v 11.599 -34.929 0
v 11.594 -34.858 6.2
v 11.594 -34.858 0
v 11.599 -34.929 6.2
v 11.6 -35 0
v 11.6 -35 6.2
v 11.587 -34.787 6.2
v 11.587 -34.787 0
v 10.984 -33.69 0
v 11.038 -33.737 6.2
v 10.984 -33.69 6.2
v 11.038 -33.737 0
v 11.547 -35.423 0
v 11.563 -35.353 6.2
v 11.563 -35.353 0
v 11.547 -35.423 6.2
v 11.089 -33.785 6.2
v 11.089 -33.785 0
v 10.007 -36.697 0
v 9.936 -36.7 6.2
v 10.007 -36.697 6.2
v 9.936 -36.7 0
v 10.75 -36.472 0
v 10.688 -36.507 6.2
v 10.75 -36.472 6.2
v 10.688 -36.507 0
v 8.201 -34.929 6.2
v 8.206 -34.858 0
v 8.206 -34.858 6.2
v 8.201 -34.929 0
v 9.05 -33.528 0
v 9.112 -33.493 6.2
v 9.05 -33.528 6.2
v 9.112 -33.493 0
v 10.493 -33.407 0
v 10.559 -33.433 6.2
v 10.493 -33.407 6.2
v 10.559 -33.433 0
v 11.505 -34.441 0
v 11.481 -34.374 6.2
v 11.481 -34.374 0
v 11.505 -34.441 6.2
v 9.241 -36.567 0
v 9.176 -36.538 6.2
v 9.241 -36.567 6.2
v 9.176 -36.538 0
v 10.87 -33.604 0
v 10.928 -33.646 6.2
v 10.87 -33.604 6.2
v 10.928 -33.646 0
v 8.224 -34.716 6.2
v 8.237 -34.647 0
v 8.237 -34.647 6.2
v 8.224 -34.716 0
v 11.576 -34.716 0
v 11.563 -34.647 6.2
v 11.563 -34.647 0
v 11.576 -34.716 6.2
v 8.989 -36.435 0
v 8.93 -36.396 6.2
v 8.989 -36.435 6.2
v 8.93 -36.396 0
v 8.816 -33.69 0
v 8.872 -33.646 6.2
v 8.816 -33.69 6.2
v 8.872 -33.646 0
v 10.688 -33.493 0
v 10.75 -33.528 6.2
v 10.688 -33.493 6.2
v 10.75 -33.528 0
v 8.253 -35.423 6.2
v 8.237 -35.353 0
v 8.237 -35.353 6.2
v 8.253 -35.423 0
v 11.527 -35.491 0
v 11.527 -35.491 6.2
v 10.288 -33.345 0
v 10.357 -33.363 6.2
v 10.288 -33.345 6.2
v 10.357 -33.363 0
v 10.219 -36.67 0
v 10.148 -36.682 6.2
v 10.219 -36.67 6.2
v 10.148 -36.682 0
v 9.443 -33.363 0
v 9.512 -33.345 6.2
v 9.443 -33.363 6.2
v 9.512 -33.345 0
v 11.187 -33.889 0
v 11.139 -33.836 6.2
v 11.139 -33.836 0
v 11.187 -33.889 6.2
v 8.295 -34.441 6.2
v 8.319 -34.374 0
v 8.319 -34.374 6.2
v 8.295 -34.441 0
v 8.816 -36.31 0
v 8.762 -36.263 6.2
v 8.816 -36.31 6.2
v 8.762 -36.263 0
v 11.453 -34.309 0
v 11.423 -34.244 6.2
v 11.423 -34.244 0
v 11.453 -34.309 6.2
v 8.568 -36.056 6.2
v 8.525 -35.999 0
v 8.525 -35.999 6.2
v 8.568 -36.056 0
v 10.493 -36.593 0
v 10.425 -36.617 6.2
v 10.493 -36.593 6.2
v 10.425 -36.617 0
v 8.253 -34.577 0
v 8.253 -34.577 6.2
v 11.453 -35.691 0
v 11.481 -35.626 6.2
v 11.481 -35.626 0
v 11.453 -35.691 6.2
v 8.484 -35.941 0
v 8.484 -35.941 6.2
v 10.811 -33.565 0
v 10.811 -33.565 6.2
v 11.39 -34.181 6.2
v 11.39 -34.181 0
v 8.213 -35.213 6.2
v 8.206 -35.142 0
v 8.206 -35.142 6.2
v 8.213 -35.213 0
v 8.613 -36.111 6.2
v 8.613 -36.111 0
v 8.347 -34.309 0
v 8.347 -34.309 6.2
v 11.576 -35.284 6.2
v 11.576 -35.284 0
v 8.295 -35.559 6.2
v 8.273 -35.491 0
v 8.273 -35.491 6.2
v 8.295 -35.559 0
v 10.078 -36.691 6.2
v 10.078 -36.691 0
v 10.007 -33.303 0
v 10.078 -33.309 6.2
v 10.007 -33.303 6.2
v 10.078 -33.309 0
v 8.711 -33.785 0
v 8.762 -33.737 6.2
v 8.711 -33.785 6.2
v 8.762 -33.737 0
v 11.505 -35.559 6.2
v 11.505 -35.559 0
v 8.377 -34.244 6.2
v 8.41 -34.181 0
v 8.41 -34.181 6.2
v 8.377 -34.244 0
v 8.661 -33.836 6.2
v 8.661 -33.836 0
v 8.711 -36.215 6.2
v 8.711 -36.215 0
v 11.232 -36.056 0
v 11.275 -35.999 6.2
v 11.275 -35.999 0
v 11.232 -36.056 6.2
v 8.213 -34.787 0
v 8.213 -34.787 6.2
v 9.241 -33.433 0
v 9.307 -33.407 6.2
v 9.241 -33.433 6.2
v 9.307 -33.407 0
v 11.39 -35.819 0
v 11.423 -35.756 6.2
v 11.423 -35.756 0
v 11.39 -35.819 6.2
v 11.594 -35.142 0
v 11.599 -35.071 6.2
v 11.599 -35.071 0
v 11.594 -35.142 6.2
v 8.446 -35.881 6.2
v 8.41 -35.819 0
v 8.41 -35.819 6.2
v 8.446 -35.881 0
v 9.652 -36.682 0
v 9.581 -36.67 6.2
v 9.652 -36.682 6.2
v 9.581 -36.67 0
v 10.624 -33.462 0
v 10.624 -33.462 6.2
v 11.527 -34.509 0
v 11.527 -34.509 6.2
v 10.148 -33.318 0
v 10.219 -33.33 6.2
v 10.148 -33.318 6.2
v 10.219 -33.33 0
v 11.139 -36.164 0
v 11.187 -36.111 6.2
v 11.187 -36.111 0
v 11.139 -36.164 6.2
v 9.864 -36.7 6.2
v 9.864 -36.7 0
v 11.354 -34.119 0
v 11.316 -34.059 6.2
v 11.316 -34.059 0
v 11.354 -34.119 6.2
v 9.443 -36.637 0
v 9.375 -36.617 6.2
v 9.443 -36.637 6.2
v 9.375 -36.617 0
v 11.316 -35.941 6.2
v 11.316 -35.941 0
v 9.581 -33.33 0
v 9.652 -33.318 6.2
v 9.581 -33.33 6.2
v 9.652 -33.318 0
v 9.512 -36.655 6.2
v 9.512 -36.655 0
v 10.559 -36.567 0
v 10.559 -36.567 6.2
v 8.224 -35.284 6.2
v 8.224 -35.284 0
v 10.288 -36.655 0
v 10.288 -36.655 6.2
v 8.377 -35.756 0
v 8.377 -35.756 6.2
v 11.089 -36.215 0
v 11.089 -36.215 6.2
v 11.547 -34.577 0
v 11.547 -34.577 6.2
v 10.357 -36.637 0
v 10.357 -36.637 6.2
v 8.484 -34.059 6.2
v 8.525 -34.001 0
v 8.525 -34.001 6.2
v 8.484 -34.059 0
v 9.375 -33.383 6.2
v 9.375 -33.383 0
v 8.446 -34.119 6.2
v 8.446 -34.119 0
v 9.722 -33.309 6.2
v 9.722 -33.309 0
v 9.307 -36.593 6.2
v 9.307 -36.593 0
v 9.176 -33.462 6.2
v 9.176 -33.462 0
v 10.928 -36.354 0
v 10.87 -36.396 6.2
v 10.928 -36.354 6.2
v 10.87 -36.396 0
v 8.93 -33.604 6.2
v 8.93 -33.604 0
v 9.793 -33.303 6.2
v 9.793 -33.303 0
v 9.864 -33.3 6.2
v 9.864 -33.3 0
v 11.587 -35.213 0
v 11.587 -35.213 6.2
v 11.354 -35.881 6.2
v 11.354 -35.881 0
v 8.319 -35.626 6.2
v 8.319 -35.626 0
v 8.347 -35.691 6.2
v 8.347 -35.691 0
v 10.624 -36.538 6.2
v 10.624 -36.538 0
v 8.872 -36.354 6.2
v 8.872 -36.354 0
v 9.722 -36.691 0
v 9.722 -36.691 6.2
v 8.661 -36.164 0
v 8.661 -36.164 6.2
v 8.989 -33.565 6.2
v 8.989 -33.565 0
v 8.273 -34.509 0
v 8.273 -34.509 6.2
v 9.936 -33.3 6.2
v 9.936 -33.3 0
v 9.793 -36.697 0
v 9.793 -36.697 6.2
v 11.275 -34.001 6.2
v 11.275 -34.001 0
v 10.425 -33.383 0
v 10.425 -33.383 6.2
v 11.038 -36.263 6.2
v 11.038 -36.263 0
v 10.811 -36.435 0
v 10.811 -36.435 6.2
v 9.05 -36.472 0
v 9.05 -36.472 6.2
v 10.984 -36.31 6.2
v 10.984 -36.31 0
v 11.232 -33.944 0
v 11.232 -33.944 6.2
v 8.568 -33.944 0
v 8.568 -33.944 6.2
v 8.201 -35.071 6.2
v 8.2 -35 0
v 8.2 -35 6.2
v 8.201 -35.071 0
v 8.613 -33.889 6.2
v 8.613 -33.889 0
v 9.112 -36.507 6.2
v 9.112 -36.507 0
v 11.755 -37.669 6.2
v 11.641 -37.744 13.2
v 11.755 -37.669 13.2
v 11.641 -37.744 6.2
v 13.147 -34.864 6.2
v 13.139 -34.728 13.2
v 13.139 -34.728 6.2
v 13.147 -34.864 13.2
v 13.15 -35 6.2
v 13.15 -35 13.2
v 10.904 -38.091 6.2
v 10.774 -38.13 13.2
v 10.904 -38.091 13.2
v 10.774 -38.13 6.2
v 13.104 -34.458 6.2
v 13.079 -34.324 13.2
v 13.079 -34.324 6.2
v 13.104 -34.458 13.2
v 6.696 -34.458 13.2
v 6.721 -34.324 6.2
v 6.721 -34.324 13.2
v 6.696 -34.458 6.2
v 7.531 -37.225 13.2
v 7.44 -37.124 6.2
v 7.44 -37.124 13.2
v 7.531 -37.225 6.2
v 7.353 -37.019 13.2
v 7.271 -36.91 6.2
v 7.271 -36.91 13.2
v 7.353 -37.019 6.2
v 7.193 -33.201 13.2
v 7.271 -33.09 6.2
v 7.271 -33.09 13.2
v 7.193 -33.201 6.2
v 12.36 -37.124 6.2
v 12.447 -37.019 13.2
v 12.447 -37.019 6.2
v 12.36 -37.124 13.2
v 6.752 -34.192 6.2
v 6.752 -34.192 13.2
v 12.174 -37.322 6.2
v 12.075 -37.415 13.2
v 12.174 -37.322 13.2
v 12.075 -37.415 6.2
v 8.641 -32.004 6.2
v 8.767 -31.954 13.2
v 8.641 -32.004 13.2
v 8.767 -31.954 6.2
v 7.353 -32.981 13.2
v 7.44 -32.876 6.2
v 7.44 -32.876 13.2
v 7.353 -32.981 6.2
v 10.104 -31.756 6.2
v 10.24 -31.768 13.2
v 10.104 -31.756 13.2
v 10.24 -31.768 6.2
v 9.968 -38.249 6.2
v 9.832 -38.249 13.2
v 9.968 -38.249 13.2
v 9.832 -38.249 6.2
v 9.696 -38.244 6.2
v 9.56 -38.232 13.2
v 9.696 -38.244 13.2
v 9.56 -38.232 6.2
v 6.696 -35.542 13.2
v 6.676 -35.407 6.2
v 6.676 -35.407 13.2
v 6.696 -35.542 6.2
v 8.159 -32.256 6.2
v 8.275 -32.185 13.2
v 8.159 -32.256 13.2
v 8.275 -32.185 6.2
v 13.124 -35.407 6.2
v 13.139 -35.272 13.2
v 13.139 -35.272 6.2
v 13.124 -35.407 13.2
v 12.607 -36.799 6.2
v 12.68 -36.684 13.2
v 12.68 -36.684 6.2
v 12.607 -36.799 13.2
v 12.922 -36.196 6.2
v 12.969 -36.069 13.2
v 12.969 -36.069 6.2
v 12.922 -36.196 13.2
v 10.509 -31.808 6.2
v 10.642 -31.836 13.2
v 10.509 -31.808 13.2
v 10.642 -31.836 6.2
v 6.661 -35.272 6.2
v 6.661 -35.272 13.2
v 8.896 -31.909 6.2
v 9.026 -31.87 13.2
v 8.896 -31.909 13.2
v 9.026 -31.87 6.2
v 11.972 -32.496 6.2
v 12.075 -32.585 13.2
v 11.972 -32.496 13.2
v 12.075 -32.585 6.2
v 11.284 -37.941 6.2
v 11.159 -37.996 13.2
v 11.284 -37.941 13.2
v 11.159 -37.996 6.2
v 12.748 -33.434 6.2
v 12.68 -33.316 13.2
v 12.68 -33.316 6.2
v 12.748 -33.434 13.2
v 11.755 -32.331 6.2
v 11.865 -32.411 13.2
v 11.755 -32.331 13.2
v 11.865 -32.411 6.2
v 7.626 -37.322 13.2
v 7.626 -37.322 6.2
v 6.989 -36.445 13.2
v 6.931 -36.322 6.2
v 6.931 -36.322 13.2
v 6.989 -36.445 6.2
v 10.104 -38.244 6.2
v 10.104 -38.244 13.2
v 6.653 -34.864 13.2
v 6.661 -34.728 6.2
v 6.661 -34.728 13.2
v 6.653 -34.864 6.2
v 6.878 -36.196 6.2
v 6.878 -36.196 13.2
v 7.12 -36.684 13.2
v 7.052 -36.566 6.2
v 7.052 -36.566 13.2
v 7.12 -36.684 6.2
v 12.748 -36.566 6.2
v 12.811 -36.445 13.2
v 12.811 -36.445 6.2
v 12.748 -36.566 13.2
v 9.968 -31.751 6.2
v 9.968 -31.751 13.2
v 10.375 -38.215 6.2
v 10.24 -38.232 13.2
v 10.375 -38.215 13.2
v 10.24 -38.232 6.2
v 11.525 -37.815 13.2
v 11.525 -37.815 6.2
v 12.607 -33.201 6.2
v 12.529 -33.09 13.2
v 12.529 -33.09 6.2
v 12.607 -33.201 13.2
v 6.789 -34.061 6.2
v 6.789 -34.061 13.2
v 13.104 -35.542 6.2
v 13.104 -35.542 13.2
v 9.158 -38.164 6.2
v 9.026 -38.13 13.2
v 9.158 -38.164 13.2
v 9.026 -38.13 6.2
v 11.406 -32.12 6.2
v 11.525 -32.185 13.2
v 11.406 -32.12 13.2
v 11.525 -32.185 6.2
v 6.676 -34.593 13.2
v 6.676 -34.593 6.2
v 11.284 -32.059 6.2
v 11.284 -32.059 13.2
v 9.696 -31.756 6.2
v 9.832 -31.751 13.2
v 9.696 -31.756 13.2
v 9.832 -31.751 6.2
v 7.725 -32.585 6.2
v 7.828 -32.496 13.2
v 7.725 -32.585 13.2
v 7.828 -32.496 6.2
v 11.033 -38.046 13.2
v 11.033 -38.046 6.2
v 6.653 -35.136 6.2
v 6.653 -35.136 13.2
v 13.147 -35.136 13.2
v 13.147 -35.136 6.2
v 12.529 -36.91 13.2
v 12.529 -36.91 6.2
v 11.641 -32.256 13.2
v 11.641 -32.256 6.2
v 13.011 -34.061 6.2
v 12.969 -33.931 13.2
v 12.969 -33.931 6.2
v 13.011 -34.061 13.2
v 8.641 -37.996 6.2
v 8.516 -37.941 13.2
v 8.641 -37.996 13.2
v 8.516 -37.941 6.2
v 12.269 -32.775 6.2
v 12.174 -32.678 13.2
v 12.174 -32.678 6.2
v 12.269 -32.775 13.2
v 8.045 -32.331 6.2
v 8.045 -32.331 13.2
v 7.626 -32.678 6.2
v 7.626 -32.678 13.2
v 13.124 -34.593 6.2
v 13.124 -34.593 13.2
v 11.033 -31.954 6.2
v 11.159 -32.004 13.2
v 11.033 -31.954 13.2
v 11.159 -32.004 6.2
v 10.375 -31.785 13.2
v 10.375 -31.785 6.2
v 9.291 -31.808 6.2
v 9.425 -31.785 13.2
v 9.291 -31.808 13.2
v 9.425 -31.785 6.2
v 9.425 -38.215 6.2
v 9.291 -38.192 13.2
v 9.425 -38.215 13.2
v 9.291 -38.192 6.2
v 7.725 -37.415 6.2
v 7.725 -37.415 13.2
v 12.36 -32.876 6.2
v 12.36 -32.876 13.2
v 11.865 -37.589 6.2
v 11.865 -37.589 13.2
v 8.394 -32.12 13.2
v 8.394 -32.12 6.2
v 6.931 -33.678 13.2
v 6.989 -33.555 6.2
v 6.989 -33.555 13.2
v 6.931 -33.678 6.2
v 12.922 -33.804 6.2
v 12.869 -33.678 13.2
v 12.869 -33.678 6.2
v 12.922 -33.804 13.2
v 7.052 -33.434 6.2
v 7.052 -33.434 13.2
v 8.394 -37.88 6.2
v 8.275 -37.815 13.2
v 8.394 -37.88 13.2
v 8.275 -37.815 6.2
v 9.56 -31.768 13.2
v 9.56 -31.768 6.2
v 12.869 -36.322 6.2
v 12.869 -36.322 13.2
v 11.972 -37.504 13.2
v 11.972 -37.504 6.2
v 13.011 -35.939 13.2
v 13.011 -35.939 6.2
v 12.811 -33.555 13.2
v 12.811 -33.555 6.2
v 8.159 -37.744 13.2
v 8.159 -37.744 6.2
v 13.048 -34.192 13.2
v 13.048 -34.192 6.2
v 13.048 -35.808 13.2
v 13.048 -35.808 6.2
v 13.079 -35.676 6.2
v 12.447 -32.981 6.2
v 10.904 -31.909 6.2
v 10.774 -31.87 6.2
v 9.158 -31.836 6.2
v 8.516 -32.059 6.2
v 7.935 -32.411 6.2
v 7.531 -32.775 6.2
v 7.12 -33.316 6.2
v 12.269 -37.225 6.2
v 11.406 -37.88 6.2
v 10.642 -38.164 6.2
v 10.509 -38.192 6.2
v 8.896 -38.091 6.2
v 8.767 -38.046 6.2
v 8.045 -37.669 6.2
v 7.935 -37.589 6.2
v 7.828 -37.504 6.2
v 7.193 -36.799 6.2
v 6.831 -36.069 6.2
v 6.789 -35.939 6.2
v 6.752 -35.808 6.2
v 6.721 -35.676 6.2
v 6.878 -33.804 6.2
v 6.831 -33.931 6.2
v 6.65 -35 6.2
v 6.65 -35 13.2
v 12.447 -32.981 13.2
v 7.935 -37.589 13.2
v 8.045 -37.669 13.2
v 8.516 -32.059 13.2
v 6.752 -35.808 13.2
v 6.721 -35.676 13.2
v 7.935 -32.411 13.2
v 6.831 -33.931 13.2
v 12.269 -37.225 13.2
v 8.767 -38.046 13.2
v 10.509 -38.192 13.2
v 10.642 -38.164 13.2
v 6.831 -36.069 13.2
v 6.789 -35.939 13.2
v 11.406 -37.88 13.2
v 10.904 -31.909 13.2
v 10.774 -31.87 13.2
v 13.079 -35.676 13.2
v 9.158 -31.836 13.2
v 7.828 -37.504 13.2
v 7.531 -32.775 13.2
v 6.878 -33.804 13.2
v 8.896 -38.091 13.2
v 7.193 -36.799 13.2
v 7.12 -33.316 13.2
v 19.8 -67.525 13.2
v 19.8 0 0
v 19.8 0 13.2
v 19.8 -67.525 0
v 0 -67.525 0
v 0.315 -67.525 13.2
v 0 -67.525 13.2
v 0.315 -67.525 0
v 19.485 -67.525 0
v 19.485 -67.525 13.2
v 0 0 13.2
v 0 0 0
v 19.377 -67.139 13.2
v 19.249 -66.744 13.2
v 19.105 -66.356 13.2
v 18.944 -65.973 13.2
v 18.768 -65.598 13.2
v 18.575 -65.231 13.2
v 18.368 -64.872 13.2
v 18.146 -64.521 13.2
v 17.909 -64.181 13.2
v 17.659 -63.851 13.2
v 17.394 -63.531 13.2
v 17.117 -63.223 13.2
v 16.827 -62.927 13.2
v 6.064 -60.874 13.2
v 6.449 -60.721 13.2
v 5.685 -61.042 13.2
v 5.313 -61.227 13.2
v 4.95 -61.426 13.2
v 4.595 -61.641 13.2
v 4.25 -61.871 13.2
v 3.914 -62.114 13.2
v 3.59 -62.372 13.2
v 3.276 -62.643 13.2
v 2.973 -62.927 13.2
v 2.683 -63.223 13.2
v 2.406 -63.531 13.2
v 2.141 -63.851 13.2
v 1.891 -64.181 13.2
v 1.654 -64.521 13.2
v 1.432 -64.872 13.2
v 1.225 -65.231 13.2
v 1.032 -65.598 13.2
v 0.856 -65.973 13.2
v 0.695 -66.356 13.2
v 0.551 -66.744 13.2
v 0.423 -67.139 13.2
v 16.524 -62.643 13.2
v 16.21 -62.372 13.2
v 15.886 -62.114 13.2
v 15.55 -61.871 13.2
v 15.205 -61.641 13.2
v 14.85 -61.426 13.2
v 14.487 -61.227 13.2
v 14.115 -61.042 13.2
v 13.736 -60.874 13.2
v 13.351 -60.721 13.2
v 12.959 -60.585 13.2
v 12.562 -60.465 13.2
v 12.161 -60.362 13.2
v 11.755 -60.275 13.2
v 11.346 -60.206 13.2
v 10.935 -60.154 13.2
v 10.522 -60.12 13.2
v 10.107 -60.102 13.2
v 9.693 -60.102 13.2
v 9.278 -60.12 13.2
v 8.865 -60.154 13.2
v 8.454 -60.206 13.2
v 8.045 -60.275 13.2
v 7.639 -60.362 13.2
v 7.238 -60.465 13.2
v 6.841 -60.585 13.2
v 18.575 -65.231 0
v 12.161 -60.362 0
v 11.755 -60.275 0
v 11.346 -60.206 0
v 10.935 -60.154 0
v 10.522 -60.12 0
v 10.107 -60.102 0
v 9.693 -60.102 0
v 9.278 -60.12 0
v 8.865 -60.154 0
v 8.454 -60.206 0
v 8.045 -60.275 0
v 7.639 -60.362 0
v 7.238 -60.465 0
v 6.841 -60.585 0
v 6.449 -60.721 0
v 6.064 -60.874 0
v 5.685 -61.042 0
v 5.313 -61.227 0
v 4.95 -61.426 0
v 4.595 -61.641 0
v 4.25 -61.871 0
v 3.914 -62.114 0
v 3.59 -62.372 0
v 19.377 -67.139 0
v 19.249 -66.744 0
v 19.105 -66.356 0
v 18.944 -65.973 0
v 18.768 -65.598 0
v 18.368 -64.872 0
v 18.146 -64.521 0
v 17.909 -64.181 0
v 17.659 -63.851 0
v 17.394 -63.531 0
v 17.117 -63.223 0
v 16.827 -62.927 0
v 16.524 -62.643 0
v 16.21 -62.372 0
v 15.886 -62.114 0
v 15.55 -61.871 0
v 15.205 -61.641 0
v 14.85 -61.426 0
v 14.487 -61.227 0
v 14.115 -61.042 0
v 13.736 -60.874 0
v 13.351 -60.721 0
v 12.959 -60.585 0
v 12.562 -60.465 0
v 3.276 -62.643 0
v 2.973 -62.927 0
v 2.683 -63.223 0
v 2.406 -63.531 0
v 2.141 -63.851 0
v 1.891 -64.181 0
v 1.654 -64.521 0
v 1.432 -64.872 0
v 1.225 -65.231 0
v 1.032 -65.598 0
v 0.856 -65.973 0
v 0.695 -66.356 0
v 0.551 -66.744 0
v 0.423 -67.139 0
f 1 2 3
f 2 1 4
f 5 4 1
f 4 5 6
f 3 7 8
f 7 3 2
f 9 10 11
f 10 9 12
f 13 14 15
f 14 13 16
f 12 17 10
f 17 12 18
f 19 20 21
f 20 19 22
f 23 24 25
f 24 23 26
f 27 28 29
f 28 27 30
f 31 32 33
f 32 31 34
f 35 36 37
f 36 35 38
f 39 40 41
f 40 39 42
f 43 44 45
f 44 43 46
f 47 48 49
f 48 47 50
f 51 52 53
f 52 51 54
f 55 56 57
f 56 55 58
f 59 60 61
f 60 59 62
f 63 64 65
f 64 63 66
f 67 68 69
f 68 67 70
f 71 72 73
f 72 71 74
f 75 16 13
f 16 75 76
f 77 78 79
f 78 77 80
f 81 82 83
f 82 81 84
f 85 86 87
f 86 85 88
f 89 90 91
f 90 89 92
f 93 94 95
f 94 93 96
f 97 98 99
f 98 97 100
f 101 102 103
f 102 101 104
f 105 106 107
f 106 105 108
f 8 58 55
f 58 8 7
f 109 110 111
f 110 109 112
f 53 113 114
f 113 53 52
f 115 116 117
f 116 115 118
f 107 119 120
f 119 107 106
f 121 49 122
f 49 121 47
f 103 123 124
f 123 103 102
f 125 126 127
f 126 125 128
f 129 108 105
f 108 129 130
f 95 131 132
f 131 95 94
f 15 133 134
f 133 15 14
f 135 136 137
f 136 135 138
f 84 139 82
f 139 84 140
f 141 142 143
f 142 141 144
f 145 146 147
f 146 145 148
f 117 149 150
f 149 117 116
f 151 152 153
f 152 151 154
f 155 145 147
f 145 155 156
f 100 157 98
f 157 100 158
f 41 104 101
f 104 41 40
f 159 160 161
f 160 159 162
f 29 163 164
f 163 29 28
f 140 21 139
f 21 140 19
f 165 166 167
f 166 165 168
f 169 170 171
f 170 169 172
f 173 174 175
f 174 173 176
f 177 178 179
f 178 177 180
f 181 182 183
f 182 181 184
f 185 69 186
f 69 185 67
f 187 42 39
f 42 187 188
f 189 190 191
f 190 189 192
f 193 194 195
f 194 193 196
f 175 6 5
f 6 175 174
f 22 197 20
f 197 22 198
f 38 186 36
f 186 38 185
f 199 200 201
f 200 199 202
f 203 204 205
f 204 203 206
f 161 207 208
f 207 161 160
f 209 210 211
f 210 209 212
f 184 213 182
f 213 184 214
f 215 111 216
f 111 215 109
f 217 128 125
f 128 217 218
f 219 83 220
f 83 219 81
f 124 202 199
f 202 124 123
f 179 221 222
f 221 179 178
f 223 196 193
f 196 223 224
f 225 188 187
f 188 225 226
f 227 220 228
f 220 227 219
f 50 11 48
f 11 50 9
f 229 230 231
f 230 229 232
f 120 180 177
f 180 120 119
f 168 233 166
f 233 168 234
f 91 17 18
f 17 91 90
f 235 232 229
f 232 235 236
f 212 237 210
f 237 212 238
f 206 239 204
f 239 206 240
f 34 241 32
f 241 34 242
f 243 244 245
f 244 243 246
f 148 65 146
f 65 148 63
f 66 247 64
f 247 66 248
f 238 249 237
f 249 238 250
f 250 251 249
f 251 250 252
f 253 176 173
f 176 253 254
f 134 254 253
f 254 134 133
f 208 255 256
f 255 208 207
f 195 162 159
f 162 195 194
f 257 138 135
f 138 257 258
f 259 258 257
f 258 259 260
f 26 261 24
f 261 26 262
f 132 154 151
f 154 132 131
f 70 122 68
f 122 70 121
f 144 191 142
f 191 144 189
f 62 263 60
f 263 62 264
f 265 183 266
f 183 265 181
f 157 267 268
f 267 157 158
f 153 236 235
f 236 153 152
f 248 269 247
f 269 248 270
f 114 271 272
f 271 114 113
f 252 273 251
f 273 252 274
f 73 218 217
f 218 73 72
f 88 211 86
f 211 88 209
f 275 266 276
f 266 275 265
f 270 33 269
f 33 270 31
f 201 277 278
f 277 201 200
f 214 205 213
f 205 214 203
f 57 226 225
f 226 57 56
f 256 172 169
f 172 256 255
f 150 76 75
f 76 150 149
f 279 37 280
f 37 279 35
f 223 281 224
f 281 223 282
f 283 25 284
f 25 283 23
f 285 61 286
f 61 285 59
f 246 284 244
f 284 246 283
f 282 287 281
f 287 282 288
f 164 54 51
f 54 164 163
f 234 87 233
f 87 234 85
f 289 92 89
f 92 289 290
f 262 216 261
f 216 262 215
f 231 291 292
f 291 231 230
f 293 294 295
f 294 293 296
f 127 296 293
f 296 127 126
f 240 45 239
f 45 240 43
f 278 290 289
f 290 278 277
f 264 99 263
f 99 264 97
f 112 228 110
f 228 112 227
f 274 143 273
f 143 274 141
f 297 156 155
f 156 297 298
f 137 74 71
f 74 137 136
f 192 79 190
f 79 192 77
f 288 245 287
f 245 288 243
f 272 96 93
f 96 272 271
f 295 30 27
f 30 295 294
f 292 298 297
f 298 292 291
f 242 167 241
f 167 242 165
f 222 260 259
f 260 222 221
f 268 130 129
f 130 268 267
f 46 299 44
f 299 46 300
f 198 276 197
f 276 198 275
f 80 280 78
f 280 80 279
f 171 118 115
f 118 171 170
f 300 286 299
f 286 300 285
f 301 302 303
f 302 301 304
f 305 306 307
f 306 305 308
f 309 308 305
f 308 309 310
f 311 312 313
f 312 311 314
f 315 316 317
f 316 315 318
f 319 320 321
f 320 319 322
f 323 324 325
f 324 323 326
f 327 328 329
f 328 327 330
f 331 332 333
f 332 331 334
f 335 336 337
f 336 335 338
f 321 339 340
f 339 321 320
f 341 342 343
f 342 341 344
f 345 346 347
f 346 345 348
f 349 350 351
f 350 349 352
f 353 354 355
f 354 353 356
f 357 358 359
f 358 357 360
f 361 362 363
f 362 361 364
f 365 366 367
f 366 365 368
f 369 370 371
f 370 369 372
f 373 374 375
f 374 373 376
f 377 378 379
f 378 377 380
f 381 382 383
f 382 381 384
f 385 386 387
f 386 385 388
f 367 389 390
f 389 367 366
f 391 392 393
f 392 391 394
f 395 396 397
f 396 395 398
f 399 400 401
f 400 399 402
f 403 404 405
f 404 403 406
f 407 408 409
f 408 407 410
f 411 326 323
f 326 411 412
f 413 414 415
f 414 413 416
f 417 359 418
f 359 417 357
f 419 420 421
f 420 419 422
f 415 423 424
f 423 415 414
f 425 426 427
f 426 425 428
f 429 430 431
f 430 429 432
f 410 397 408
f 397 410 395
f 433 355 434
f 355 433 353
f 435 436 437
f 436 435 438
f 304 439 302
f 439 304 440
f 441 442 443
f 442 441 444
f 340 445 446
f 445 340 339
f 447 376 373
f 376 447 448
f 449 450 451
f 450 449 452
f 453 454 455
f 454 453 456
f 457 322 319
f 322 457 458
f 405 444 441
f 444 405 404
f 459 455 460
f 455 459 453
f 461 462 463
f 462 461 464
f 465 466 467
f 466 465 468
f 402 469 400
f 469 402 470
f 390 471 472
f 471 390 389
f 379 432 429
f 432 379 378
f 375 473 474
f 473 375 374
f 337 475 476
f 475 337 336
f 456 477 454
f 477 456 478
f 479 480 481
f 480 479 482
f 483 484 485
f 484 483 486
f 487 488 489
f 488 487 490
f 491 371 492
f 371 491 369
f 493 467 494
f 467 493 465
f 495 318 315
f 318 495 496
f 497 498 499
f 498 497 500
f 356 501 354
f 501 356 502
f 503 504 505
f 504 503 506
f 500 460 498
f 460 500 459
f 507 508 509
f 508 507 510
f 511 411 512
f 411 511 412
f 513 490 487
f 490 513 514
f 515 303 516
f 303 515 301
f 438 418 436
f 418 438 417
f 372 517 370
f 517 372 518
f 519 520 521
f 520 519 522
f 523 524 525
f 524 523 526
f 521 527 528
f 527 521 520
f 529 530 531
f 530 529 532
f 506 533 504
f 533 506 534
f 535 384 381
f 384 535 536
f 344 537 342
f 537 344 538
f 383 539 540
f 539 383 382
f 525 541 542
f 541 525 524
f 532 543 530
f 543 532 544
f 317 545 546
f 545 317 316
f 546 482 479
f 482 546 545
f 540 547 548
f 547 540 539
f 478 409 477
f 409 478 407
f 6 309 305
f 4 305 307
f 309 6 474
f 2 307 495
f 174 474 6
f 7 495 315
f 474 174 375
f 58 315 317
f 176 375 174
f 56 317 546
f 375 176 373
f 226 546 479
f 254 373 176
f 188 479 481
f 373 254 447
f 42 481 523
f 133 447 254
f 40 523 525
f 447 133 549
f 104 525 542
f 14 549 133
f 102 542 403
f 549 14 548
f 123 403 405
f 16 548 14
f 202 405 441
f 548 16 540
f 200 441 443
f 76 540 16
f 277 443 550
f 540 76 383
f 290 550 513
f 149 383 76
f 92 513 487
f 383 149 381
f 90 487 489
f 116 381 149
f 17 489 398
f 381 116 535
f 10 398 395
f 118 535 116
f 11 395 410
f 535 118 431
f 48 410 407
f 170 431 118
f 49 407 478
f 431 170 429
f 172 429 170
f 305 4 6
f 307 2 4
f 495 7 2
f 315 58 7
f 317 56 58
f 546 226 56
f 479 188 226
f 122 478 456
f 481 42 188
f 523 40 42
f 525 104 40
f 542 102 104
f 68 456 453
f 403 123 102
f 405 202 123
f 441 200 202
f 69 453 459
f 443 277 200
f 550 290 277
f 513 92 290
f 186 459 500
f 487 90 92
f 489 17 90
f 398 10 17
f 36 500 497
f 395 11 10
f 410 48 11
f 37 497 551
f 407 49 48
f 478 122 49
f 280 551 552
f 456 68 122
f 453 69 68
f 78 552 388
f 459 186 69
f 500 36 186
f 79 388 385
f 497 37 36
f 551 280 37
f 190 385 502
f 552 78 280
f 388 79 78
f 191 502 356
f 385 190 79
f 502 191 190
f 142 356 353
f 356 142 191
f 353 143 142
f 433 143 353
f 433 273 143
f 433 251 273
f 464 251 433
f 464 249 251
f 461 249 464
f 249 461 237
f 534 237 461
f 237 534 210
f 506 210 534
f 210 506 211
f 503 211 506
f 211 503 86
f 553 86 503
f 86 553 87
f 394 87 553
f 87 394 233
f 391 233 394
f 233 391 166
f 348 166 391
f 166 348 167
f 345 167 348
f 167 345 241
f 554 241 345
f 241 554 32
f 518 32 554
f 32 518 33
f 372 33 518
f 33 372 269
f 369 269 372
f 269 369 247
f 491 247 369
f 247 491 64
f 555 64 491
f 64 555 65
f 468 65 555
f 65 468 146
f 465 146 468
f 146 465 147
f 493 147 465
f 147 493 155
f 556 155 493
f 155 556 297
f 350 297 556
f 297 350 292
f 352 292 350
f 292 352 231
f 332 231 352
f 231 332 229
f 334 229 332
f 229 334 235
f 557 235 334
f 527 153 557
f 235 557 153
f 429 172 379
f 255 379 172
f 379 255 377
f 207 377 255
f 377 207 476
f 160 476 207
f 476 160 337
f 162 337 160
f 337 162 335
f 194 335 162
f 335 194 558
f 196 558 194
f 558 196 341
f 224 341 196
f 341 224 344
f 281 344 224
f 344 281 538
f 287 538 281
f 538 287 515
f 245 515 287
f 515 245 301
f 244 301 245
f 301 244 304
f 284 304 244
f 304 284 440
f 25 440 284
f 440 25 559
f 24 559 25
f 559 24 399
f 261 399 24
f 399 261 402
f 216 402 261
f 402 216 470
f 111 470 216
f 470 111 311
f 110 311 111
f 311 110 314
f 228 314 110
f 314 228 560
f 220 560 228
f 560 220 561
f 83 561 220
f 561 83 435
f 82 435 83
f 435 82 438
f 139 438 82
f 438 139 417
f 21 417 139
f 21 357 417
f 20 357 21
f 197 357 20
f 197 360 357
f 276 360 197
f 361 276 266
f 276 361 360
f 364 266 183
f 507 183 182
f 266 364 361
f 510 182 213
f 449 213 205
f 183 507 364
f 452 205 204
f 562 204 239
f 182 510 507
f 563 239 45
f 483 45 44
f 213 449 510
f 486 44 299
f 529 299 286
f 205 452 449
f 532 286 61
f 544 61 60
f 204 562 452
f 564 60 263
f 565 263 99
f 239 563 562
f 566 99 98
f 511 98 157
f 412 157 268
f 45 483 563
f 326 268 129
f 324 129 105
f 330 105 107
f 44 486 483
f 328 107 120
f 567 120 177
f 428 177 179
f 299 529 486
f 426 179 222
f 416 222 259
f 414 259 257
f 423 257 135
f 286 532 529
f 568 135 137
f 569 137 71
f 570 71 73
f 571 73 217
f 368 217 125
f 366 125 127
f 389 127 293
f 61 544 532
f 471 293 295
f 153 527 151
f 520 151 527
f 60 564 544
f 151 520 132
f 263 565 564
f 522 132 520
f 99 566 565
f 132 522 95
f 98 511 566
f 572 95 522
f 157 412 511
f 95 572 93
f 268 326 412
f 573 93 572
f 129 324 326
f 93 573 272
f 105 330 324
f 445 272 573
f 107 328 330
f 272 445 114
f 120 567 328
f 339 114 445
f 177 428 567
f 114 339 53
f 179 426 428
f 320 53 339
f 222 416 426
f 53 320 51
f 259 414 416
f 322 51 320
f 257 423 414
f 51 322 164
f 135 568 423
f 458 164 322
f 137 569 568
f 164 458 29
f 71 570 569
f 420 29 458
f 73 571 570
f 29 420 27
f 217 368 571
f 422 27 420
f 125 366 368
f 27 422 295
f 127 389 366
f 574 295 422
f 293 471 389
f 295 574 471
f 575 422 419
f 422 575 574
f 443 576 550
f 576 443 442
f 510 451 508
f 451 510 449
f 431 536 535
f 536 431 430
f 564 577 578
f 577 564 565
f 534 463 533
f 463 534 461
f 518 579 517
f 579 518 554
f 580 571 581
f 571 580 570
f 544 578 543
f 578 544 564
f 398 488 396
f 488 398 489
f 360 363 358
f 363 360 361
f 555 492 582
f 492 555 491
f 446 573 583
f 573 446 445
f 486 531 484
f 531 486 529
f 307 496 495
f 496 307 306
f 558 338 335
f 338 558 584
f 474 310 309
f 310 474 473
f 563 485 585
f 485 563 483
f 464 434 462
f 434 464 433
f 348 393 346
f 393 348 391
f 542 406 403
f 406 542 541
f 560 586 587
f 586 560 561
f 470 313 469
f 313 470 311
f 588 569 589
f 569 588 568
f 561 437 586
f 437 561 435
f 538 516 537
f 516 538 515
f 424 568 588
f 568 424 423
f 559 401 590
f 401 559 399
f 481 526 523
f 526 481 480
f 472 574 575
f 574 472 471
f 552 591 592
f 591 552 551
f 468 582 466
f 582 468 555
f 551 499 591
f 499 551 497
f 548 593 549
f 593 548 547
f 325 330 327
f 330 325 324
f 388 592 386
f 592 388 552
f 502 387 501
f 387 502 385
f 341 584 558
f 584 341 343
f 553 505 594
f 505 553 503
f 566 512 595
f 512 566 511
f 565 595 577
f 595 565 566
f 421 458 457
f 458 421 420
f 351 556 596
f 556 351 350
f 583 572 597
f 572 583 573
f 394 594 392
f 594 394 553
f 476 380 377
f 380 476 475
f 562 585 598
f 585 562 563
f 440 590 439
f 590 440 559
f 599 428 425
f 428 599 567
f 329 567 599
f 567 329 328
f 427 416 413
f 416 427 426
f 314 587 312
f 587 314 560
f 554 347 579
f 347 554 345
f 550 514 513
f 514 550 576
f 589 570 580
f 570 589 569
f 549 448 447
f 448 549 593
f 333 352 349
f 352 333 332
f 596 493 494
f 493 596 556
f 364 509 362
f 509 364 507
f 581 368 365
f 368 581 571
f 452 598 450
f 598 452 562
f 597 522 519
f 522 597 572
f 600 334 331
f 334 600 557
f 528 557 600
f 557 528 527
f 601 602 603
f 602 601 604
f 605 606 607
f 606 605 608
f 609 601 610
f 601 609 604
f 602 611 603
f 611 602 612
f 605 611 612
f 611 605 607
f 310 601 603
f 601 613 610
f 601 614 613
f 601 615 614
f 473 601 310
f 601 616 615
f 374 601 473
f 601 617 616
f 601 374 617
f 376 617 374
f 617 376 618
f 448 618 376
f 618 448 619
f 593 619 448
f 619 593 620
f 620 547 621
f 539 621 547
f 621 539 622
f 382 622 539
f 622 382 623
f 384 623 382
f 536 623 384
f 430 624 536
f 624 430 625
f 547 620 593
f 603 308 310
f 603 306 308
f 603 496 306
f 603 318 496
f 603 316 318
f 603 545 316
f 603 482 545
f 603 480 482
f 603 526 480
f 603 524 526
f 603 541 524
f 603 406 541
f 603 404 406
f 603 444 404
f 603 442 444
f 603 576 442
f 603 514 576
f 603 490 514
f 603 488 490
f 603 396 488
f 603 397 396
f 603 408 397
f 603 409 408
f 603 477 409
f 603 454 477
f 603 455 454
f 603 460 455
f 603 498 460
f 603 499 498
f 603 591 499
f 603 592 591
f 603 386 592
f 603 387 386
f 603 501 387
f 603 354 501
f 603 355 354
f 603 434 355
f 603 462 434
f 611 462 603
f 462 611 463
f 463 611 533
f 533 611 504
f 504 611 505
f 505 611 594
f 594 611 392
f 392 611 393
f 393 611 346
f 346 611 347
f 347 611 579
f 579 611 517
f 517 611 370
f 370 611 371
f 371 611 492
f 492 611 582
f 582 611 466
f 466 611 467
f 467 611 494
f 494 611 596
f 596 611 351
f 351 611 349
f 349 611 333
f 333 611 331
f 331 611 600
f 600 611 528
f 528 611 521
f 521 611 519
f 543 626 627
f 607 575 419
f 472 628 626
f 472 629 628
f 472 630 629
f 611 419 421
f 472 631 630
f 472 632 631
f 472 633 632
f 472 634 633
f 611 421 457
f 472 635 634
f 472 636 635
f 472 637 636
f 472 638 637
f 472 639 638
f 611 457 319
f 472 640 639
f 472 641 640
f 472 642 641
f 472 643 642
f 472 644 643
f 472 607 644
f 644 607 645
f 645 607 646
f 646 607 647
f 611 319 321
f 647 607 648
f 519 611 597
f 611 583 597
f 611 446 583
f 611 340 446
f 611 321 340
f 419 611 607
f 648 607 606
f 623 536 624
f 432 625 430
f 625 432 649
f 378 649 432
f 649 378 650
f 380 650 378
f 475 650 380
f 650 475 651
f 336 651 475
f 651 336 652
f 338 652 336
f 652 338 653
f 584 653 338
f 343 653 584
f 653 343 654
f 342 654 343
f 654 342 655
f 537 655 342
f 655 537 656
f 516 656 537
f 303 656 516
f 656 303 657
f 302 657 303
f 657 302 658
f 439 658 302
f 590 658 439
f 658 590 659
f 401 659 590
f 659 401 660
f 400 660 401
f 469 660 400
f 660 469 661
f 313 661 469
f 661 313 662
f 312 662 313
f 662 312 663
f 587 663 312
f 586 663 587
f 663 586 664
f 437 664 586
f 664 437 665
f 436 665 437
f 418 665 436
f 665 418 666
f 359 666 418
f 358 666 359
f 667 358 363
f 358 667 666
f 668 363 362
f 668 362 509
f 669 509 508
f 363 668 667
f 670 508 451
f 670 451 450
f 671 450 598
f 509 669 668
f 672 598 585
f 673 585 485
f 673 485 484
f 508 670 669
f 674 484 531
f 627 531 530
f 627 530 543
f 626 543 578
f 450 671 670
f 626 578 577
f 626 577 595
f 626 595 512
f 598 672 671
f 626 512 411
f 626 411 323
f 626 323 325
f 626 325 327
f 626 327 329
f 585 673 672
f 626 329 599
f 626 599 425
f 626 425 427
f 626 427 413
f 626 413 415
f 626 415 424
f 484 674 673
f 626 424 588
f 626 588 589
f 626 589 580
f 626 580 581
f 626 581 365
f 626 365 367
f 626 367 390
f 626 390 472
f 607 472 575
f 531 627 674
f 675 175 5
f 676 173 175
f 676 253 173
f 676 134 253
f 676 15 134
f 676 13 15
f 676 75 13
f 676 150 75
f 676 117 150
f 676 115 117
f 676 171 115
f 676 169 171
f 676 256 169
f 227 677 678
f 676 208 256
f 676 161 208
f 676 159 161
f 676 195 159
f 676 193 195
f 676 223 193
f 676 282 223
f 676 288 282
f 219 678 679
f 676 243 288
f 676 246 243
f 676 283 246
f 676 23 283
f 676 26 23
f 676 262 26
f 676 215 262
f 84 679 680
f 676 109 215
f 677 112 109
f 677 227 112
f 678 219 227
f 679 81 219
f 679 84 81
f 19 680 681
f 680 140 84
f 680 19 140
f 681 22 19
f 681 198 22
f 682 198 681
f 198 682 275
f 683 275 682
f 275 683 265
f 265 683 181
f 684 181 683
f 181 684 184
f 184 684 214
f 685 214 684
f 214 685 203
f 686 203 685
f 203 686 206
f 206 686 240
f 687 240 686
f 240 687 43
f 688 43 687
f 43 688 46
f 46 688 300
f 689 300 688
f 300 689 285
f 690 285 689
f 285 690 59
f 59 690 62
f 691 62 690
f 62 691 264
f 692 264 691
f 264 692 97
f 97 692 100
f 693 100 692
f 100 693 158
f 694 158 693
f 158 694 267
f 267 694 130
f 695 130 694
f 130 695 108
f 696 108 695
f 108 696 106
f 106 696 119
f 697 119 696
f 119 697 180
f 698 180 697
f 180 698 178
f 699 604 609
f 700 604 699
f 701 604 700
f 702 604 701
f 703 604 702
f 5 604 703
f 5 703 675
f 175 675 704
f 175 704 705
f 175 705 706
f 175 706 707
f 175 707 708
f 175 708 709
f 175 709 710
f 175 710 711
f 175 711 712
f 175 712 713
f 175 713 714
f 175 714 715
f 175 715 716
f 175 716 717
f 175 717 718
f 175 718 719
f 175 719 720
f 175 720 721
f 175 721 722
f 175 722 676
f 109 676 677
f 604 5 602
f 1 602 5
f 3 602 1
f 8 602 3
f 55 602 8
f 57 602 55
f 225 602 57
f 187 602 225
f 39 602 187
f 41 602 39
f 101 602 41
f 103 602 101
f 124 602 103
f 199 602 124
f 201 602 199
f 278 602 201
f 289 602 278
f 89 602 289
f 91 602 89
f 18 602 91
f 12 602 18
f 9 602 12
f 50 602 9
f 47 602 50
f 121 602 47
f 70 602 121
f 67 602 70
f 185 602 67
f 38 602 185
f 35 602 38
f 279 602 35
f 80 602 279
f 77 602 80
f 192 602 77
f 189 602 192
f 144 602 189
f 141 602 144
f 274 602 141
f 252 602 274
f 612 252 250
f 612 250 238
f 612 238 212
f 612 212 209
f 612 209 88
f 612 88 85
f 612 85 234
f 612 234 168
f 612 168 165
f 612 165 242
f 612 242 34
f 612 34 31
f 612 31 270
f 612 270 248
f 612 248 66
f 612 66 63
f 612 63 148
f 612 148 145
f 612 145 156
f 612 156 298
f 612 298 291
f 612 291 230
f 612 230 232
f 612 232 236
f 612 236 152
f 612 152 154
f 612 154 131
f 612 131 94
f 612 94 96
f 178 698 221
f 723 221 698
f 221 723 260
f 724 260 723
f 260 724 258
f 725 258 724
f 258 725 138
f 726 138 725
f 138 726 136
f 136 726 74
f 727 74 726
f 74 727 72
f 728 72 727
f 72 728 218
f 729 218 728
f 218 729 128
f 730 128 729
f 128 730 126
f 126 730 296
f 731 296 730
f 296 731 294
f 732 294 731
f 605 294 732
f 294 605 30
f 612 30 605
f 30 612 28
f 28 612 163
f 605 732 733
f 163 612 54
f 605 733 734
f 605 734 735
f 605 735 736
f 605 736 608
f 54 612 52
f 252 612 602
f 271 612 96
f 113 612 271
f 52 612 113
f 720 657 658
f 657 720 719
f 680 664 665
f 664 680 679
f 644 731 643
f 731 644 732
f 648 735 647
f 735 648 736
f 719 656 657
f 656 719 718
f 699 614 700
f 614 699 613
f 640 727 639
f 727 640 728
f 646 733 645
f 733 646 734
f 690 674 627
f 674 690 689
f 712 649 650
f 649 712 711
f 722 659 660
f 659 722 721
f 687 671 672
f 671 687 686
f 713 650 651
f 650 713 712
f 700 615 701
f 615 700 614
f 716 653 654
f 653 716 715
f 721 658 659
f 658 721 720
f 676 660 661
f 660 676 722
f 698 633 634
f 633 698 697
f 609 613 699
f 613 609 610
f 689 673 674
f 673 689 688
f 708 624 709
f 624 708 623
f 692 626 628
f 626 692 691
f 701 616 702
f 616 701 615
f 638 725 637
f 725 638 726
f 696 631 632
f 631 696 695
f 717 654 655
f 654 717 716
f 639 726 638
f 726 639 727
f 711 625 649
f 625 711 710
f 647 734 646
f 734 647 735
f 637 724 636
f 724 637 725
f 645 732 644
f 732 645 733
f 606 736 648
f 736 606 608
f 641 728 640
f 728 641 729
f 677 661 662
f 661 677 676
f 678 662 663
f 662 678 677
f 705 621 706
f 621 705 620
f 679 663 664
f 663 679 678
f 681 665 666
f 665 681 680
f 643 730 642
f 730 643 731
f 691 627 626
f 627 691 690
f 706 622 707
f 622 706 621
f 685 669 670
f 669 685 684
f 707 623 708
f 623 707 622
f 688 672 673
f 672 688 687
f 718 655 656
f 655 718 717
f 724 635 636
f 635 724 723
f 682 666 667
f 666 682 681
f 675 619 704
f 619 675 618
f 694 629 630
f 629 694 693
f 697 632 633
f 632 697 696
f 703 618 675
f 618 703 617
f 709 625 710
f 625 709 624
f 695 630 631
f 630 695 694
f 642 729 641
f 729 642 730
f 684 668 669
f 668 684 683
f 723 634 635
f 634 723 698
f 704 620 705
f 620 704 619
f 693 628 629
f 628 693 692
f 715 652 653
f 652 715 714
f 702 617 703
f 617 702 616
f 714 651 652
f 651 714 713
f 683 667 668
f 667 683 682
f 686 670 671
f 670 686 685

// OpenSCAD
/* [Support Info] */

// bar diameter + 2*tolerance
wood_diam = 19.8; // 0.1

// Box length (inner space) (mm)
support_height = 70;
// 70mm -> Print 2 (first uper)
// 74mm -> Print 2 (first mid)
// 80mm -> Print 2 (first lower)
// 63mm -> Print 2 (second uper)
// 60mm -> Print 2 (second mid)
// 90mm -> Print 2 (second lower)
// 35mm -> Print 2 (third uper)
// 80mm -> Print 2 (third mid)
// 100mm -> Print 2 (third lower)

screw_diam = 3.4;

screw_head_diam = 6.5;

/* [Printer settings] */
// Printer tolerance. Printers are not perfect, pieces need a bit of margin to fit. (mm)
tolerance = 0.4;

/* [Other] */

// $fn resolution
fn = 150;


rotate(a = 90, v = [1,0,0]) 
difference() 
{
    cube(size = [wood_diam, wood_diam*2/3, support_height-wood_diam/8]);

    translate(v = [wood_diam/2, wood_diam + tolerance, support_height]) 
    rotate(a = 90, v = [1,0,0]) 
    cylinder(h = wood_diam + tolerance * 2, r = wood_diam/2, $fn = fn);

    translate(v = [wood_diam/2, -tolerance, support_height/2]) 
    rotate(a = 90, v = [-1,0,0]) 
    union()
    {
        cylinder(h = wood_diam + tolerance * 2, r = screw_diam/2, $fn = fn);
        translate(v = [0,0, wood_diam/3]) 
        cylinder(h = wood_diam/2 + tolerance * 2, r = screw_head_diam/2, $fn = fn);
    }
}
